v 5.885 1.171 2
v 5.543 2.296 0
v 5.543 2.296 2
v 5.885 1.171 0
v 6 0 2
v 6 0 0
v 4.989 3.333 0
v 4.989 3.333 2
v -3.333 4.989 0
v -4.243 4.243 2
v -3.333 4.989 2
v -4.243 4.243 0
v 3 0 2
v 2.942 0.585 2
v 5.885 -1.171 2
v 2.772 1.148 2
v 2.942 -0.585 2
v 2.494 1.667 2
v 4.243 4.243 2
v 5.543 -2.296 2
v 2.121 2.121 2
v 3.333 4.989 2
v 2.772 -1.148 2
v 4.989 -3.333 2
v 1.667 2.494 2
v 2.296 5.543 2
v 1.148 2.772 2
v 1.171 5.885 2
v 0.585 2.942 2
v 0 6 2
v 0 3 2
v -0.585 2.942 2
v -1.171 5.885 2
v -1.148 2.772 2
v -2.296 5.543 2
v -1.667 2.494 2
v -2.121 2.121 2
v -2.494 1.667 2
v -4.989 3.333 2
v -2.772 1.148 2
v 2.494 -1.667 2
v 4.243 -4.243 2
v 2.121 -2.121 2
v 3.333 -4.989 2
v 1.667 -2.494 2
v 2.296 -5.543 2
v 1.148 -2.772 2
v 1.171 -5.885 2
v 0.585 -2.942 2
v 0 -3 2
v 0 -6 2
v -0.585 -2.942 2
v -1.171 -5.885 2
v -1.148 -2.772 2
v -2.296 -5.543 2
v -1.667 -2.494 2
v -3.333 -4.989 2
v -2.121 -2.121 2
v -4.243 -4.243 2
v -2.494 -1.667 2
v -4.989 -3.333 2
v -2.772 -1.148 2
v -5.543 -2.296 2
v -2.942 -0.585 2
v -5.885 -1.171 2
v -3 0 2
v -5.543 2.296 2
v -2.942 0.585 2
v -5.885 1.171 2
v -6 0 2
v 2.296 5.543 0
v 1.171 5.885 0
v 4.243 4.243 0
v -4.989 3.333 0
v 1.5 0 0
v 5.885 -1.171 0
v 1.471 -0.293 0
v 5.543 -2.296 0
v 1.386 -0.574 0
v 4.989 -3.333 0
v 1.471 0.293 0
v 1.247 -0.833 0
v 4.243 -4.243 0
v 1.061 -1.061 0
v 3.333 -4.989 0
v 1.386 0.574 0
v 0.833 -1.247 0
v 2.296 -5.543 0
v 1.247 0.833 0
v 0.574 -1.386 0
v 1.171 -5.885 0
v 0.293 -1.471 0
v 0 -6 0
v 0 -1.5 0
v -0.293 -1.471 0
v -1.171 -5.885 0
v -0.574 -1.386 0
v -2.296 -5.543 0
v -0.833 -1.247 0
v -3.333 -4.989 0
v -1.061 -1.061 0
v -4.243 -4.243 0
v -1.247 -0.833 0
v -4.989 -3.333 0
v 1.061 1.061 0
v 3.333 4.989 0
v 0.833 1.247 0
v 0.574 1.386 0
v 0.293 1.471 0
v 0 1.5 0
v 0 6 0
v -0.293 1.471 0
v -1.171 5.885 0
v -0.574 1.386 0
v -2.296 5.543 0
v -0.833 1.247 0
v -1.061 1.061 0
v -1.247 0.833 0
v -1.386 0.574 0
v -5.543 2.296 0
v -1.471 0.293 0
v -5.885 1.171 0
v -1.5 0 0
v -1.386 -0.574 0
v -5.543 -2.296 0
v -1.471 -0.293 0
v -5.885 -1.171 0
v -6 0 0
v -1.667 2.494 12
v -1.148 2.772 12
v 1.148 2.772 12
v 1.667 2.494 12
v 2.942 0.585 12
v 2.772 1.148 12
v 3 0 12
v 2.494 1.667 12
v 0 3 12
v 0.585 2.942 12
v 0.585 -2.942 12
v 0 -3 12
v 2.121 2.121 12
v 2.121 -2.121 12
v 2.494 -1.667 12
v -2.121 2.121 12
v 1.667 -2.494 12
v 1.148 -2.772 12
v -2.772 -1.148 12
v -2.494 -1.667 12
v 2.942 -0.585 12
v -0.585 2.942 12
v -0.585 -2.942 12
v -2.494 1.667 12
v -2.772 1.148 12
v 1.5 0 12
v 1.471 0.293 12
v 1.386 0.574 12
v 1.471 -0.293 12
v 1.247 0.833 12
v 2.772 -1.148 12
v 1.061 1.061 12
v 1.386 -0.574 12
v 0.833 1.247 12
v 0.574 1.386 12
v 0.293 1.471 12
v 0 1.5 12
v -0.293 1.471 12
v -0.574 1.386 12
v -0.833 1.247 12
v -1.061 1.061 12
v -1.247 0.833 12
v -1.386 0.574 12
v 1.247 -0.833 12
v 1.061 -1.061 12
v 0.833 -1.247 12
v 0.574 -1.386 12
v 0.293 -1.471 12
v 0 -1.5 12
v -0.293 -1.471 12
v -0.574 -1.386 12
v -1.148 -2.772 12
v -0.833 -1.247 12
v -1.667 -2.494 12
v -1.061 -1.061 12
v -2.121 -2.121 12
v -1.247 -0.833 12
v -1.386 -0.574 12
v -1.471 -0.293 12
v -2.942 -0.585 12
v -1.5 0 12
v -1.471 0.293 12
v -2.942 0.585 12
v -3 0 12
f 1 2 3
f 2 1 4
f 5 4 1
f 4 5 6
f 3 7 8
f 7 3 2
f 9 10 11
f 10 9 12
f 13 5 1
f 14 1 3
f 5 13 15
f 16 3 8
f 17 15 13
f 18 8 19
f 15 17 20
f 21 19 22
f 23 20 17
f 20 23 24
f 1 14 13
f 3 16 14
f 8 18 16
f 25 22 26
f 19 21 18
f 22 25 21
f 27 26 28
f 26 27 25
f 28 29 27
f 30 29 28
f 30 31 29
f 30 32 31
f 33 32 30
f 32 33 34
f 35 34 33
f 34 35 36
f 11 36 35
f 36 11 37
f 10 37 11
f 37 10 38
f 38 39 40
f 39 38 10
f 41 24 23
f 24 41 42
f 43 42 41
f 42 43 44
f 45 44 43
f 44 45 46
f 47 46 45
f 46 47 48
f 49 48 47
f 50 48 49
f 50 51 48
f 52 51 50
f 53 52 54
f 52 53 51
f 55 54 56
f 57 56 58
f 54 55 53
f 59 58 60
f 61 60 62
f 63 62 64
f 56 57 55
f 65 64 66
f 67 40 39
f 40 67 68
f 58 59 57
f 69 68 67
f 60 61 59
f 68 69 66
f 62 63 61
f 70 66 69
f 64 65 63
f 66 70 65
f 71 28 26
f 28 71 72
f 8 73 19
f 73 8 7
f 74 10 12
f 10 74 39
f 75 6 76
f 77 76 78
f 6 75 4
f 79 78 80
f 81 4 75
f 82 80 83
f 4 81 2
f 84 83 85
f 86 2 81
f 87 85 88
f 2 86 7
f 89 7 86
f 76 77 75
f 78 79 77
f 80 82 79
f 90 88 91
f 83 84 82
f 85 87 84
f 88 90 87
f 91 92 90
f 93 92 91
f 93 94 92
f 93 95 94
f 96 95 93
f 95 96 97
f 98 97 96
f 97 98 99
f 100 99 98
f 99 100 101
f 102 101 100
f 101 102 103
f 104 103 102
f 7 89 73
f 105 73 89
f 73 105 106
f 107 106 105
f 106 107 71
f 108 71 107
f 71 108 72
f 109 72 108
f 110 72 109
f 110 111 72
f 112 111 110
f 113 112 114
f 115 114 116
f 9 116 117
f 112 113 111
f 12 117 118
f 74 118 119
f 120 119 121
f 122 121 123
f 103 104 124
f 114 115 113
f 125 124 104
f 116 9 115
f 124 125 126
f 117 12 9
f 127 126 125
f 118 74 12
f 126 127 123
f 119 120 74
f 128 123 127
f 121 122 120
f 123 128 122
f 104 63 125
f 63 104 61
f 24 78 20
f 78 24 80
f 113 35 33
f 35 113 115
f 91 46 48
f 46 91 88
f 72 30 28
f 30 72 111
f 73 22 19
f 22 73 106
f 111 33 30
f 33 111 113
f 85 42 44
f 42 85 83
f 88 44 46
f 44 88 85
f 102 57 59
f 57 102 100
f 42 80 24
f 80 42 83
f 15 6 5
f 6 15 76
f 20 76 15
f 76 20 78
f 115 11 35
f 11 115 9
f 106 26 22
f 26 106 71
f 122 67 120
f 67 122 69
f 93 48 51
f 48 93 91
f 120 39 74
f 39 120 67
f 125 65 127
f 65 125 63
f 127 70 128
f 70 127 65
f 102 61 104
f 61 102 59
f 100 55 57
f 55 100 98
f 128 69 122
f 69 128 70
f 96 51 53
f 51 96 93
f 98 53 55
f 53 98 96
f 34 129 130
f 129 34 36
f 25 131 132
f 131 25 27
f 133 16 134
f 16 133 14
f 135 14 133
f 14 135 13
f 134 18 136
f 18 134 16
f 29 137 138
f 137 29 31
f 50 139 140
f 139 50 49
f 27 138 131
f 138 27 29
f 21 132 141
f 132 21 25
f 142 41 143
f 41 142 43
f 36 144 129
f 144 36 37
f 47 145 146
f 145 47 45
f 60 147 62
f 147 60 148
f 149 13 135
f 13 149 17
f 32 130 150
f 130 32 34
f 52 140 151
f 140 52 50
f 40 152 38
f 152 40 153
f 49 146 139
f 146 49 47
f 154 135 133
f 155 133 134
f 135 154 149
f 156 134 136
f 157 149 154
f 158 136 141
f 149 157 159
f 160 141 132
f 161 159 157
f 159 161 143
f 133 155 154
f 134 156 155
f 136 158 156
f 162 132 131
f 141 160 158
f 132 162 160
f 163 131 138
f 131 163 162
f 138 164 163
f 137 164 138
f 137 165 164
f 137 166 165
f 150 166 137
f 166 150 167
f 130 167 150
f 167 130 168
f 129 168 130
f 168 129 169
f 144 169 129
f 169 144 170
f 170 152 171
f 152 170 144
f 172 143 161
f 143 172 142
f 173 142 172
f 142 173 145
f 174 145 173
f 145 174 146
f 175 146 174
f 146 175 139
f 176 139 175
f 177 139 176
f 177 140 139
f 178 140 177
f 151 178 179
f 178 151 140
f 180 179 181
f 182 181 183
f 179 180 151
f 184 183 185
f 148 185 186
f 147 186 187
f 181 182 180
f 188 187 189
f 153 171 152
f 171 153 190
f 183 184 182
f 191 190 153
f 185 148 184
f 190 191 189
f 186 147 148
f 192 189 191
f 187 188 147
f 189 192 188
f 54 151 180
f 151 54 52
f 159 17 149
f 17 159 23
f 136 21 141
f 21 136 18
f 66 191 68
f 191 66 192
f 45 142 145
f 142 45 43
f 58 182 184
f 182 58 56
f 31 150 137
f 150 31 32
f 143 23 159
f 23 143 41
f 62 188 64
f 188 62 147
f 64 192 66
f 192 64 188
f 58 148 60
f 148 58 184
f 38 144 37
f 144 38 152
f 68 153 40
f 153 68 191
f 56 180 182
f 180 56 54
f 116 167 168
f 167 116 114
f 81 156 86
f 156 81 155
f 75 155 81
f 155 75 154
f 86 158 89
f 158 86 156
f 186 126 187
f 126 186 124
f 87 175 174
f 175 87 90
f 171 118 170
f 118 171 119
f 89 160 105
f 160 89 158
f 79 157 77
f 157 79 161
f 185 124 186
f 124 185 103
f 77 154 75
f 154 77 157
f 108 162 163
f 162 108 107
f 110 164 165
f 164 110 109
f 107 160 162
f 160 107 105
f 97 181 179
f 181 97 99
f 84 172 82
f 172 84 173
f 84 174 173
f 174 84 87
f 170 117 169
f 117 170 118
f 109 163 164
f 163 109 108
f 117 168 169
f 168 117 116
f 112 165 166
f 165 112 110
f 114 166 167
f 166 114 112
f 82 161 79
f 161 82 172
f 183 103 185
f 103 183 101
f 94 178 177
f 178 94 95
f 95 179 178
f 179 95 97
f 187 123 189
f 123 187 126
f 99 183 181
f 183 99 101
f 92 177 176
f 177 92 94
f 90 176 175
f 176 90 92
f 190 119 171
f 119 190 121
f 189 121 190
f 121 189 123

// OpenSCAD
$fn = 32;

// ----------------------------------------------------------------------
// Micro post: flanged post, 5-20 mm class
// ----------------------------------------------------------------------

// --- parameters (mm) ---
post_d = 6;               // post diameter
post_h = 10;              // post height above the flange
flange_d = 12;            // flange diameter
flange_t = 2;             // flange thickness
bore_d = 3;               // through bore

total_h = post_h + flange_t;  // overall height

difference() {
  union() {
    cylinder(h = flange_t, d = flange_d);
    translate([0, 0, flange_t]) cylinder(h = post_h, d = post_d);
  }
  translate([0, 0, -1]) cylinder(h = total_h + 2, d = bore_d);
}
